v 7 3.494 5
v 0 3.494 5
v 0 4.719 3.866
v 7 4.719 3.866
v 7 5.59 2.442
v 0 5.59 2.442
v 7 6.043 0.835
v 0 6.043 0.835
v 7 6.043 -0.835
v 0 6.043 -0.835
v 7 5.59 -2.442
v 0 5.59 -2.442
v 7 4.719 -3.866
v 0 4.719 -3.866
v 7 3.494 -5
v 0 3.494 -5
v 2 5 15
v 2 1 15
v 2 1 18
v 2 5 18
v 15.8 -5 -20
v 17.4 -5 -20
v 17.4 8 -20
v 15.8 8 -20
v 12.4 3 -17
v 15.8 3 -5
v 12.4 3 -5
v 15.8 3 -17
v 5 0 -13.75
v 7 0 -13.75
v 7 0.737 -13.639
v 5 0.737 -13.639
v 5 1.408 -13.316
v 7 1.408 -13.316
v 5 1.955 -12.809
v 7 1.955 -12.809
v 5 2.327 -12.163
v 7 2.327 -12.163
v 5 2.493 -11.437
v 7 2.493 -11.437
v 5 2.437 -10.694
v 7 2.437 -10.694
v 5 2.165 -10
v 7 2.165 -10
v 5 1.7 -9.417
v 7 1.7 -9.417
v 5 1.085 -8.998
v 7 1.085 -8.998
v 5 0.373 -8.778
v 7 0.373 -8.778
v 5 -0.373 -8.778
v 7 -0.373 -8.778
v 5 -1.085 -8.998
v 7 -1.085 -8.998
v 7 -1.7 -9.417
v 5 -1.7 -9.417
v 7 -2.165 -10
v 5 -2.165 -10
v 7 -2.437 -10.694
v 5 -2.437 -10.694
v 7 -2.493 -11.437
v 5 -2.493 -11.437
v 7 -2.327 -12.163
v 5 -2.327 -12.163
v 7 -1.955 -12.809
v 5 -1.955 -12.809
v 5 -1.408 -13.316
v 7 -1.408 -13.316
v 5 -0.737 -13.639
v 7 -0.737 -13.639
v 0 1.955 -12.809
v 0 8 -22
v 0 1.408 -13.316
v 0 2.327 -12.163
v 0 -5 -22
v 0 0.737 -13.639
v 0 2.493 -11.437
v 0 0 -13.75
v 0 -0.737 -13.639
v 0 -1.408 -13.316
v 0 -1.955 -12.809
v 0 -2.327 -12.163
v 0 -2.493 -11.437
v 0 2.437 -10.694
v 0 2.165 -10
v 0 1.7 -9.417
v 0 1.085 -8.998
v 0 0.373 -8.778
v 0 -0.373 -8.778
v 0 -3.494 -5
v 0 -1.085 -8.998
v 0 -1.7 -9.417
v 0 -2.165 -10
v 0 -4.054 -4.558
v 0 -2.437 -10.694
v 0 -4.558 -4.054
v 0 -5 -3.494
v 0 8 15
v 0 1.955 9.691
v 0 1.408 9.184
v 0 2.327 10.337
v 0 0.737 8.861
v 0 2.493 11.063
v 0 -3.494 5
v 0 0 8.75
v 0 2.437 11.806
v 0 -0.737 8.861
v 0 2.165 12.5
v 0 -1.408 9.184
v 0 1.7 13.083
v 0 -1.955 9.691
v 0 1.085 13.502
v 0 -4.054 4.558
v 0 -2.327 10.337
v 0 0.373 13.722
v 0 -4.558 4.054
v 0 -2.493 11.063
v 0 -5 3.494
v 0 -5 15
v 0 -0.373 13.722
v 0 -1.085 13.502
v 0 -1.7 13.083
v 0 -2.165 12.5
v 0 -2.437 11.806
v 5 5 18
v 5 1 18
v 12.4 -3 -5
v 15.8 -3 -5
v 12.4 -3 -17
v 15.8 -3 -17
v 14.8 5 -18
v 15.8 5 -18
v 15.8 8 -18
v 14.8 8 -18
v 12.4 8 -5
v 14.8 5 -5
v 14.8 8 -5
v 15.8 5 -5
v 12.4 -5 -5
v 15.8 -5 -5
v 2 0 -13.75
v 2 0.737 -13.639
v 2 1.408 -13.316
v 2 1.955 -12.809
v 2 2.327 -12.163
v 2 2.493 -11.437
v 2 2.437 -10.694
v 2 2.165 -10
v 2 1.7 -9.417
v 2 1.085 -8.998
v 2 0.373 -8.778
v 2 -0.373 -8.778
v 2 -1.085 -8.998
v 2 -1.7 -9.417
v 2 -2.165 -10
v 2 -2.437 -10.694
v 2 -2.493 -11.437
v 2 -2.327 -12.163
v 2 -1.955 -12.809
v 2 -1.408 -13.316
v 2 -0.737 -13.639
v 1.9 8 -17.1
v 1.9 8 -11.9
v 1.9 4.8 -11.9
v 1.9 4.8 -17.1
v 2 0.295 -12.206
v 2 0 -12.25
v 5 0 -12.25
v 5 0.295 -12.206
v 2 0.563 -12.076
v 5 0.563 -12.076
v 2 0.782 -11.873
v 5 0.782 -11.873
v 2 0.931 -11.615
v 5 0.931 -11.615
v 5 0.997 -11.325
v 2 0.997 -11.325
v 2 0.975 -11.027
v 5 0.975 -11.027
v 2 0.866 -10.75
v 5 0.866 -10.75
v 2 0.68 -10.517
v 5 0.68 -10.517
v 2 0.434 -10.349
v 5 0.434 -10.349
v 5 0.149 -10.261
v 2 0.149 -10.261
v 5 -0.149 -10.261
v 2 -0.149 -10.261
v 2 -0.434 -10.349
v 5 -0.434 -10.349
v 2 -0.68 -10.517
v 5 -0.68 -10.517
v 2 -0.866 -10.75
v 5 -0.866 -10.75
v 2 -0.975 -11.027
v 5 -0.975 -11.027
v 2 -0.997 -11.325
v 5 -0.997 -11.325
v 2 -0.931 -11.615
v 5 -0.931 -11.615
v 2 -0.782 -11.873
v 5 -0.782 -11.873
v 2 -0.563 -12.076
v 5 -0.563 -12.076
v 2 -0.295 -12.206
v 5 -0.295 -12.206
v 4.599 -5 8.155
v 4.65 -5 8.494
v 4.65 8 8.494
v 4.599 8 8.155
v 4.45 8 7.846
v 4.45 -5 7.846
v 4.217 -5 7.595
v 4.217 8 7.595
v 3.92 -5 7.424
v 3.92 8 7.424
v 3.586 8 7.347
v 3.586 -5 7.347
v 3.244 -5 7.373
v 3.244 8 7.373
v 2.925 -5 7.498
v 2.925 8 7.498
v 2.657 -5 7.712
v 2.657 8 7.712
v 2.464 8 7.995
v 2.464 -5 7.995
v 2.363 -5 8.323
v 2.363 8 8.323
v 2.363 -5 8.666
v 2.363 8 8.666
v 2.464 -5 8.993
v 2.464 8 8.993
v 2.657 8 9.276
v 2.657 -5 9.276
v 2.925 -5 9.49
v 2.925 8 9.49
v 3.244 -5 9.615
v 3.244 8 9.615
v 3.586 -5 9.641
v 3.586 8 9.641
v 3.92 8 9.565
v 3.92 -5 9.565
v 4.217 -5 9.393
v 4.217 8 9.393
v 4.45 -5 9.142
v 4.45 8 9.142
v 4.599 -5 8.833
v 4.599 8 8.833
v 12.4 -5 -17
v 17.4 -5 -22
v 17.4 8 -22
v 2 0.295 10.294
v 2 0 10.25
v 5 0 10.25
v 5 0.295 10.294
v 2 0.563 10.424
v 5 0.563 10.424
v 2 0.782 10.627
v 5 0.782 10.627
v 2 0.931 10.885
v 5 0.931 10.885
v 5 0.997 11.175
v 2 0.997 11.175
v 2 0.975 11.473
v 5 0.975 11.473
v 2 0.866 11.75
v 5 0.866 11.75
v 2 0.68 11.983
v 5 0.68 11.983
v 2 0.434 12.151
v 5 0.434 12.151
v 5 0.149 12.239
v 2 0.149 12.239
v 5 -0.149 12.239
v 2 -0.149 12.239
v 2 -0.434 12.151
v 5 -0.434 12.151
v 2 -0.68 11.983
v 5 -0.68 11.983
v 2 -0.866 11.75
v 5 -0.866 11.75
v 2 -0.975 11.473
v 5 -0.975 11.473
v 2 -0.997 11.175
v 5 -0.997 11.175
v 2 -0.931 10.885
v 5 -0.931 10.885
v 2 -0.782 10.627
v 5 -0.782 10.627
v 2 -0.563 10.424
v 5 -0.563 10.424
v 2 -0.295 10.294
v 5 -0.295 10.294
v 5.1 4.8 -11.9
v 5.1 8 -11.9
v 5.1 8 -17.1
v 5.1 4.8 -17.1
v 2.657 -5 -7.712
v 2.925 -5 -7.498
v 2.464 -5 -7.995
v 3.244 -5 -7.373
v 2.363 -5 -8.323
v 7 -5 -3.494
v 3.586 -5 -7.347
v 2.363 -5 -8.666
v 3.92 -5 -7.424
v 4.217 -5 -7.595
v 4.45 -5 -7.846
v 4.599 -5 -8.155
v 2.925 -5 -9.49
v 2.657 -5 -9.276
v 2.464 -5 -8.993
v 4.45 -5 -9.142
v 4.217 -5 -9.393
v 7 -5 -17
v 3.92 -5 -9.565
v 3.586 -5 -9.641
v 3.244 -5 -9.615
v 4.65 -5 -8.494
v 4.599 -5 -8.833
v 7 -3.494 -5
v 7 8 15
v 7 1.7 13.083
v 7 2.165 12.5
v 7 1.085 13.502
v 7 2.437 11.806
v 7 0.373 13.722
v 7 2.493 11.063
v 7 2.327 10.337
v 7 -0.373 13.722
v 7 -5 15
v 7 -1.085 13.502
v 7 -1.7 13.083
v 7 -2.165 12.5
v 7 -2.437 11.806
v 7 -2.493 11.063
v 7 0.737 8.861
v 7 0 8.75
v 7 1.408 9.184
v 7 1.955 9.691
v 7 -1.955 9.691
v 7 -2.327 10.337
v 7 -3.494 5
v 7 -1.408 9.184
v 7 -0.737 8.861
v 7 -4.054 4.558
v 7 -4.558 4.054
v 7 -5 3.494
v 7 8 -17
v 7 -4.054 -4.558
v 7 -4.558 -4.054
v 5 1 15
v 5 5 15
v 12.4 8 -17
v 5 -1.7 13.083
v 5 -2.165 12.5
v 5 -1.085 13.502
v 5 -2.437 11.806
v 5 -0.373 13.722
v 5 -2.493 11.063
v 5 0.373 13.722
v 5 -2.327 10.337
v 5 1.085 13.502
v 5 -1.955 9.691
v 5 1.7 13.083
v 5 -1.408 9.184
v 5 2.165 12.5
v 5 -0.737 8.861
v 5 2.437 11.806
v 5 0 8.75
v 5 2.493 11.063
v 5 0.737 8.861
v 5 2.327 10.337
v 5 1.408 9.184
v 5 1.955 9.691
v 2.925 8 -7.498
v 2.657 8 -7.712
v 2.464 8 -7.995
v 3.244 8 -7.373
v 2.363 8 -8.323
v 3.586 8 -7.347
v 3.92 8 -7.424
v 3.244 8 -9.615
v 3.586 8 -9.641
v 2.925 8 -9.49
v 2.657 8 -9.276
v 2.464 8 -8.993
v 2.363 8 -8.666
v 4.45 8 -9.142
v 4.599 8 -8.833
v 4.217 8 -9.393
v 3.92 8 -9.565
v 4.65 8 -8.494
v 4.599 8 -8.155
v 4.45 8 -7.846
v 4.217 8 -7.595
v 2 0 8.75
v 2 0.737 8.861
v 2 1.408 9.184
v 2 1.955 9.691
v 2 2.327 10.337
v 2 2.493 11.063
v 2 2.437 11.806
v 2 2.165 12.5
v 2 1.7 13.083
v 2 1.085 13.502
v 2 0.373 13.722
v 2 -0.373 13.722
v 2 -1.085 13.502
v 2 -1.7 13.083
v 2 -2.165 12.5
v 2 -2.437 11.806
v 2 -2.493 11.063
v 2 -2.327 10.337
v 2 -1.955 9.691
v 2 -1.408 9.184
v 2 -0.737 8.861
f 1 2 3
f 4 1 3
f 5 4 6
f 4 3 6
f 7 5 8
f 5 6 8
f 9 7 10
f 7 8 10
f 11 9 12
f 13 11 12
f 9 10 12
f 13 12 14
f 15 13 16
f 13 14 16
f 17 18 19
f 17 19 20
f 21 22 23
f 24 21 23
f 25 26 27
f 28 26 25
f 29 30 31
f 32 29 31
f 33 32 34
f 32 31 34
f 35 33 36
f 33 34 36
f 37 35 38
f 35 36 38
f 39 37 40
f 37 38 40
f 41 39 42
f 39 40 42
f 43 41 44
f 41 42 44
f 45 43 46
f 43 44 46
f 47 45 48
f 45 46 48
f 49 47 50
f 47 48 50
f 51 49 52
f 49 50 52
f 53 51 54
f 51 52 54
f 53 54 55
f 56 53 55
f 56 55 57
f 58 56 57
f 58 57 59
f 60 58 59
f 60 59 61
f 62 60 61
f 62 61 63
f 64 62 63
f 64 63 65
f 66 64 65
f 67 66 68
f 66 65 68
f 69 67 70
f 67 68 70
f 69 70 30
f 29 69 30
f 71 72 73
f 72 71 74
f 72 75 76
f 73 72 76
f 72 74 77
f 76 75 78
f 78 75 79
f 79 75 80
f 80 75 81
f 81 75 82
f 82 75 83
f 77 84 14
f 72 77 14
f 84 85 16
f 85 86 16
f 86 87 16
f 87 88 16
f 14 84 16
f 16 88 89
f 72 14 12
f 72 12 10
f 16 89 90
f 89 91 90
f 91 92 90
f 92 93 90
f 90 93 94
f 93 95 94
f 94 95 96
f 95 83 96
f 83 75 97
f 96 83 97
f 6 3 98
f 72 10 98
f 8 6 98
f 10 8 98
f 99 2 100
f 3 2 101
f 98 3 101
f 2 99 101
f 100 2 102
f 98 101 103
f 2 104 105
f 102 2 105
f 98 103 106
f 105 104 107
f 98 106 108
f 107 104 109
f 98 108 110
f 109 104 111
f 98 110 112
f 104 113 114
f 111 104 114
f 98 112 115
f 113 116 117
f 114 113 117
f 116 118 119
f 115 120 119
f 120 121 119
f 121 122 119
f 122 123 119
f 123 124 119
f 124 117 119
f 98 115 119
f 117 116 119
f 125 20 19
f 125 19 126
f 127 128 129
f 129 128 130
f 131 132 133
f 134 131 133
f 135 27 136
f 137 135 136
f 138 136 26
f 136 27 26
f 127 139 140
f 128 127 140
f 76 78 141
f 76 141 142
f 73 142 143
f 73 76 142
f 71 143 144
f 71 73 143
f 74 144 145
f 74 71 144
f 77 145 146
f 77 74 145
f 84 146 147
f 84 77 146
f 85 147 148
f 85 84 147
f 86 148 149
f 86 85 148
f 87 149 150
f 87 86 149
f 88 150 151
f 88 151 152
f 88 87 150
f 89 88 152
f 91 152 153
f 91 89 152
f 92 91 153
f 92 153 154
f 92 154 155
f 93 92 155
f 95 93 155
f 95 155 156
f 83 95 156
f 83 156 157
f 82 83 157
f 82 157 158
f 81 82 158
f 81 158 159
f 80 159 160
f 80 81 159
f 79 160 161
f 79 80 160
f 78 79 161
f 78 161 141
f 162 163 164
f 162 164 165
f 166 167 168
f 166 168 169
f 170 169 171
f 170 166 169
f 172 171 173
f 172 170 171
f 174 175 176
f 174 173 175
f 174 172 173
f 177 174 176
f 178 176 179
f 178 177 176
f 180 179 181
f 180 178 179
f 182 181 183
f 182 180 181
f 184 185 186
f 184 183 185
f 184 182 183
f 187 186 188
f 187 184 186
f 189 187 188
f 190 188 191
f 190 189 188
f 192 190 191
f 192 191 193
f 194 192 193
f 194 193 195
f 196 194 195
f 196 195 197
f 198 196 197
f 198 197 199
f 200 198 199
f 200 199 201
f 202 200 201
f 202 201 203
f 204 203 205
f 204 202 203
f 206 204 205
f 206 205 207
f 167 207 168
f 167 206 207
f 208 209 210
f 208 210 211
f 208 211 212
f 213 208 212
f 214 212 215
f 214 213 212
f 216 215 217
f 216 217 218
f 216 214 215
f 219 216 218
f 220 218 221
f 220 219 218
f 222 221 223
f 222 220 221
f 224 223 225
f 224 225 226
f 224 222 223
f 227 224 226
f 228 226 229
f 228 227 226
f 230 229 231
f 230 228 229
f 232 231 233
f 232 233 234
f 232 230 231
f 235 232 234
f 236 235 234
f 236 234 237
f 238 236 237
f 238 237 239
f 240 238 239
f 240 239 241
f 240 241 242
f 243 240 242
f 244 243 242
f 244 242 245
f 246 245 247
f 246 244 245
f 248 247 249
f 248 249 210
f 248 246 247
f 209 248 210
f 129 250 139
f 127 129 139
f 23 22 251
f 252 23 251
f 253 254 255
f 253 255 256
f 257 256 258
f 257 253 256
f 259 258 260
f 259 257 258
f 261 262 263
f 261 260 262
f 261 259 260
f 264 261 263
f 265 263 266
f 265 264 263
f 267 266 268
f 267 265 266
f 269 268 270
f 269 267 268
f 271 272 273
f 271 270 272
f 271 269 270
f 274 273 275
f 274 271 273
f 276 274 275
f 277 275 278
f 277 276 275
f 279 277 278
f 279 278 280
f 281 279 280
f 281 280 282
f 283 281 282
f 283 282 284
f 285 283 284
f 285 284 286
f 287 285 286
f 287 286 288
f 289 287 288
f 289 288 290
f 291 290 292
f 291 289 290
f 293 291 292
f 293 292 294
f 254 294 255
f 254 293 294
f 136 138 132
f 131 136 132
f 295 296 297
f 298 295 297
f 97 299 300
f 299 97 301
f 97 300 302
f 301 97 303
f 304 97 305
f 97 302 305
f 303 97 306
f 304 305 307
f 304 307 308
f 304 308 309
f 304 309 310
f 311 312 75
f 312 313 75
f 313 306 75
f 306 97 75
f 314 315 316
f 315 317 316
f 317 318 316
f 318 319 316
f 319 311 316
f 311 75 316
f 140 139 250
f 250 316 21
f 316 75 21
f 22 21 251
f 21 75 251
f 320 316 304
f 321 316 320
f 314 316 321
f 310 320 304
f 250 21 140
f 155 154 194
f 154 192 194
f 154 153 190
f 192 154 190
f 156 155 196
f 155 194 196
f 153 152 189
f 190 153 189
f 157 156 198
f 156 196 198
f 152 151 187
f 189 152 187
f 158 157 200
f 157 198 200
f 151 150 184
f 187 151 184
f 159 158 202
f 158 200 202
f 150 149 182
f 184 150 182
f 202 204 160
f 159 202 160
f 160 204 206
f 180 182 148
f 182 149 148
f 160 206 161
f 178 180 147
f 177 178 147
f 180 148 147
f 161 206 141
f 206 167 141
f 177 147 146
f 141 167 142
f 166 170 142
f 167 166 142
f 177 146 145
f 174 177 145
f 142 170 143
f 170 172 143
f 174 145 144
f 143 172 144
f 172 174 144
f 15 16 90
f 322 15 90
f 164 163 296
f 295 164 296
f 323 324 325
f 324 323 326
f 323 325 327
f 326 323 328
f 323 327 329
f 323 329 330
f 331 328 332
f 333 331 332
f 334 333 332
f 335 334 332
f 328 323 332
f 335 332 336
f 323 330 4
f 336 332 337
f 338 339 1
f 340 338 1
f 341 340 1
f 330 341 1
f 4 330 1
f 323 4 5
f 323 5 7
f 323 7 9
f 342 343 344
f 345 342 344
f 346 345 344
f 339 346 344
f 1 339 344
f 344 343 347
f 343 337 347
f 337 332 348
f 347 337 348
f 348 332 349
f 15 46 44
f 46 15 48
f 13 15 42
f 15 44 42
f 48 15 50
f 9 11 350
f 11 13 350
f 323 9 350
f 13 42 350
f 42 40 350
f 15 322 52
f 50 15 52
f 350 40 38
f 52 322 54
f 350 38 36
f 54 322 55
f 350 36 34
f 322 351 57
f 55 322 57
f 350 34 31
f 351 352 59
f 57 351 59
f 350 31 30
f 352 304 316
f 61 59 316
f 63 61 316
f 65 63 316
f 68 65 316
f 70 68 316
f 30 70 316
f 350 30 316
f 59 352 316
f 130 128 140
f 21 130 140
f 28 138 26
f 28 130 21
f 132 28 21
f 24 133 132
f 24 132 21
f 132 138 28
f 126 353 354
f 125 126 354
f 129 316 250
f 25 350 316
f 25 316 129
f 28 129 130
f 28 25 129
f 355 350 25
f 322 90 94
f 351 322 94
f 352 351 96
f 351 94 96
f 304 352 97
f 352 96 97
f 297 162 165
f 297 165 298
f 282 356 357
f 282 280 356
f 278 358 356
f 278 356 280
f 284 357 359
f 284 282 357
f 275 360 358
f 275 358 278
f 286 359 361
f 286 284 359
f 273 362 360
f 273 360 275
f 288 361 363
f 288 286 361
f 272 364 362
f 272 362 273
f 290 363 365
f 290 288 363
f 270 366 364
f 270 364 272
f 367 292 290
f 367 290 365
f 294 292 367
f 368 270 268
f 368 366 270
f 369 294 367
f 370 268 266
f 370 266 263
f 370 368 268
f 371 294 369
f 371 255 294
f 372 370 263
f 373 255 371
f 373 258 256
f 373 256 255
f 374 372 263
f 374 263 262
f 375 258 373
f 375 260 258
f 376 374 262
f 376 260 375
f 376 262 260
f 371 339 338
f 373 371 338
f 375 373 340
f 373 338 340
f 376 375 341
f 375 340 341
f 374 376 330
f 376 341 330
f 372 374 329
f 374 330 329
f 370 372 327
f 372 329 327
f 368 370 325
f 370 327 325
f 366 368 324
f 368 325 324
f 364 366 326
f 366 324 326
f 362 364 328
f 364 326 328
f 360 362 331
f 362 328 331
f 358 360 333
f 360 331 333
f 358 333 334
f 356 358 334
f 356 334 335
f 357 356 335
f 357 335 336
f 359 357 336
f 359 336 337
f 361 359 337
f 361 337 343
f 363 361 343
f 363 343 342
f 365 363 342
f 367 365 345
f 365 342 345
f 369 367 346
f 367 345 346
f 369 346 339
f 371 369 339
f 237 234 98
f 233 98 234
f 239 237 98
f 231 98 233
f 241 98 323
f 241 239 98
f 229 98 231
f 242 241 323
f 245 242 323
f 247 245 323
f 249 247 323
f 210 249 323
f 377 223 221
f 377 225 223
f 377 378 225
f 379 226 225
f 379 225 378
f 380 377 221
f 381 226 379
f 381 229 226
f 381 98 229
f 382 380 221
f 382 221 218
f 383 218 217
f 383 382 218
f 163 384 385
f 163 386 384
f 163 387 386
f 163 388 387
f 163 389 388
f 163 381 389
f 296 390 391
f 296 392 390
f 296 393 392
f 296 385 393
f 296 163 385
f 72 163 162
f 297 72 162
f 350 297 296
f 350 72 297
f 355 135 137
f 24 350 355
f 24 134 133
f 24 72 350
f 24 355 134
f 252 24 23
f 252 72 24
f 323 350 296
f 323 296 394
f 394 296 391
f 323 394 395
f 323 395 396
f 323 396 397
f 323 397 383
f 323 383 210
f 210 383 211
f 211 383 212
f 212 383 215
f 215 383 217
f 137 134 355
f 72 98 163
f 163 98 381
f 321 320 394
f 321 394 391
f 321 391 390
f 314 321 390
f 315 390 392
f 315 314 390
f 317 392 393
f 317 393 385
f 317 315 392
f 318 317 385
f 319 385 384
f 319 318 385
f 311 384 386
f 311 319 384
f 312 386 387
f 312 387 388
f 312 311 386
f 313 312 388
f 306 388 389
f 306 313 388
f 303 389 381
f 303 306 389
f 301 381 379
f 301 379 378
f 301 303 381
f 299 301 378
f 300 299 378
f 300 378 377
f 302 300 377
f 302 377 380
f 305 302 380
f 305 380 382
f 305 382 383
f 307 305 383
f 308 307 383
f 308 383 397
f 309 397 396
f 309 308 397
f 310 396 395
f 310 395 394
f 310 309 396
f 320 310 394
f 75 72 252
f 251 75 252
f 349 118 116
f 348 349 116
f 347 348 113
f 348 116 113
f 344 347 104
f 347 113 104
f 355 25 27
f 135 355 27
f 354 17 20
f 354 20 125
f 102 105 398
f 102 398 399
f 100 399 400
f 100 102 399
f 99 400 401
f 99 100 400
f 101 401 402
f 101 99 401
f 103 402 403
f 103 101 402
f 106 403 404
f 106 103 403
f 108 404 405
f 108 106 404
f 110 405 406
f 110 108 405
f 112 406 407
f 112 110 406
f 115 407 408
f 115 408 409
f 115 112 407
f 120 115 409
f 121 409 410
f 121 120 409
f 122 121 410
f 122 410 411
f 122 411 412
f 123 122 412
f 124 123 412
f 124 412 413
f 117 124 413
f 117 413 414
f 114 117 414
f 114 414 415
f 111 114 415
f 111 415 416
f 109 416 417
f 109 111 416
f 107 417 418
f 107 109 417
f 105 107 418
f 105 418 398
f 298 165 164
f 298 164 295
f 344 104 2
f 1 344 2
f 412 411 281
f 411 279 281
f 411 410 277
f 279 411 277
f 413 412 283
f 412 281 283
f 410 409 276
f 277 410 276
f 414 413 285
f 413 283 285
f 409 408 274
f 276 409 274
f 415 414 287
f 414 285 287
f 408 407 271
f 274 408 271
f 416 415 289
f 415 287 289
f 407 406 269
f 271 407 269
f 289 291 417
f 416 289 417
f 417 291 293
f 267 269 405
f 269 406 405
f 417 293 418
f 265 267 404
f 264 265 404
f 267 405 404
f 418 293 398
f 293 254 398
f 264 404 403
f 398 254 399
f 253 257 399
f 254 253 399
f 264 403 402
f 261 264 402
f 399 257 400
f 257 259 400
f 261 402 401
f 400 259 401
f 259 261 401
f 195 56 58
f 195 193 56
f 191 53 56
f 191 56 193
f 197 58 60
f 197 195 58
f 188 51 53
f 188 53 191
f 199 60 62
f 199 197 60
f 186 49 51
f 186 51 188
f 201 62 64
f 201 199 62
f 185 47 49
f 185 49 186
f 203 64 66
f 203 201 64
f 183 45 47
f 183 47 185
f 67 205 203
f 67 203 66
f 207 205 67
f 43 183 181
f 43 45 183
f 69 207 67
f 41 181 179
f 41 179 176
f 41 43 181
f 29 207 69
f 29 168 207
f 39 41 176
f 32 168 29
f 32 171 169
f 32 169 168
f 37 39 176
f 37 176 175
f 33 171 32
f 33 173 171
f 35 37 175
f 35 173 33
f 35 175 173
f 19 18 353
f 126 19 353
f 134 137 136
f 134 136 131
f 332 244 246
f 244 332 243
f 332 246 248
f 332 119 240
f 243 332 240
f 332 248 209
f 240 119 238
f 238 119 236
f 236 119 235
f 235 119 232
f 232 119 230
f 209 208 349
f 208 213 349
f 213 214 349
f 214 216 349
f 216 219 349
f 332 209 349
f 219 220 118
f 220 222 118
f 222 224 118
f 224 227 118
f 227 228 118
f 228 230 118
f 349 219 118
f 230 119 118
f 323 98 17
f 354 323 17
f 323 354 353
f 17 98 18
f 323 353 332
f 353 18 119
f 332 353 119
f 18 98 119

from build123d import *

# Parameters (mm, degrees)
SKETCH2_R           = 1
BOSS_EXTRUDE1_DEPTH = 7
CUT_EXTRUDE1_START  = -5
SKETCH3_R           = 1.15
CUT_EXTRUDE1_DEPTH  = 13
SKETCH5_R           = 2.5
CUT_EXTRUDE2_DEPTH  = 2
CUT_EXTRUDE3_START  = 7
SKETCH5_2_R         = 2.5
CUT_EXTRUDE3_DEPTH  = 2
BOSS_EXTRUDE2_START = -5
BOSS_EXTRUDE2_DEPTH = 13
CUT_EXTRUDE4_START  = 17.4
SKETCH7_W           = 12
SKETCH7_H           = 6
CUT_EXTRUDE4_DEPTH  = 6
CUT_EXTRUDE5_START  = 17.4
SKETCH8_W           = 15
SKETCH8_H           = 13
CUT_EXTRUDE5_DEPTH  = 1.6
CUT_EXTRUDE6_START  = 15.8
SKETCH9_W           = 13
SKETCH9_H           = 3
CUT_EXTRUDE6_DEPTH  = 1
BOSS_EXTRUDE3_START = 8
SKETCH10_W          = 5.4
SKETCH10_H          = 5
BOSS_EXTRUDE3_DEPTH = 13
CUT_EXTRUDE7_START  = 8
SKETCH11_W          = 17.4
SKETCH11_H          = 3
CUT_EXTRUDE7_DEPTH  = 13
BOSS_EXTRUDE4_START = 15
SKETCH12_W          = 3
SKETCH12_H          = 4
BOSS_EXTRUDE4_DEPTH = 3
CUT_EXTRUDE8_START  = 8
SKETCH13_W          = 3.2
SKETCH13_H          = 5.2
CUT_EXTRUDE8_DEPTH  = 3.2


with BuildPart() as part:
    # Sketch2 → Boss-Extrude1 (new body)
    with BuildSketch(Plane(origin=(0, 0, 0), x_dir=(0, 0, -1), z_dir=(1, 0, 0))):
        with BuildLine():
            Line((3.494281042, -5), (15, -5))
            Line((15, -5), (15, 8))
            Line((15, 8), (-15, 8))
            Line((-15, 8), (-15, -5))
            Line((-15, -5), (-3.494281042, -5))
            ThreePointArc((-3.494281042, -5), (-4.313351365, -4.313351365), (-5, -3.494281042))
            Line((-5, -3.494281042), (-5, 3.494281042))
            ThreePointArc((-5, 3.494281042), (0, 6.1), (5, 3.494281042))
            Line((5, 3.494281042), (5, -3.494281042))
            ThreePointArc((5, -3.494281042), (4.313351365, -4.313351365), (3.494281042, -5))
        make_face()
        with Locations((-11.25, 0)):
            Circle(SKETCH2_R, mode=Mode.SUBTRACT)
        with Locations((11.25, 0)):
            Circle(SKETCH2_R, mode=Mode.SUBTRACT)
    extrude(amount=BOSS_EXTRUDE1_DEPTH)

    # Sketch3 → Cut-Extrude1 (cut)
    with BuildSketch(Plane(origin=(0, 0, 0), x_dir=(1, 0, 0), z_dir=(0, 1, 0)).offset(CUT_EXTRUDE1_START)):
        with Locations((3.5, 8.494281042)):
            Circle(SKETCH3_R)
        with Locations((3.5, -8.494281042)):
            Circle(SKETCH3_R)
    extrude(amount=CUT_EXTRUDE1_DEPTH, mode=Mode.SUBTRACT)

    # Sketch5 → Cut-Extrude2 (cut)
    with BuildSketch(Plane(origin=(0, 0, 0), x_dir=(0, 0, -1), z_dir=(1, 0, 0))):
        with Locations((11.25, 0)):
            Circle(SKETCH5_R)
        with Locations((-11.25, 0)):
            Circle(SKETCH5_R)
    extrude(amount=CUT_EXTRUDE2_DEPTH, mode=Mode.SUBTRACT)

    # Sketch5<2> → Cut-Extrude3 (cut)
    with BuildSketch(Plane(origin=(0, 0, 0), x_dir=(0, 0, -1), z_dir=(1, 0, 0)).offset(CUT_EXTRUDE3_START)):
        with Locations((11.25, 0)):
            Circle(SKETCH5_2_R)
        with Locations((-11.25, 0)):
            Circle(SKETCH5_2_R)
    extrude(amount=-CUT_EXTRUDE3_DEPTH, mode=Mode.SUBTRACT)

    # Sketch6 → Boss-Extrude2 (add)
    with BuildSketch(Plane(origin=(0, 0, 0), x_dir=(1, 0, 0), z_dir=(0, 1, 0)).offset(BOSS_EXTRUDE2_START)):
        Polygon((0, 15), (7, 15), (7, 22), (12.4, 22), (12.4, 5), (17.4, 5), (17.4, 25), (0, 25), align=None)
    extrude(amount=BOSS_EXTRUDE2_DEPTH)

    # Sketch7 → Cut-Extrude4 (cut)
    with BuildSketch(Plane(origin=(0, 0, 0), x_dir=(0, 0, -1), z_dir=(1, 0, 0)).offset(CUT_EXTRUDE4_START)):
        with Locations((11, 0)):
            Rectangle(SKETCH7_W, SKETCH7_H)
    extrude(amount=-CUT_EXTRUDE4_DEPTH, mode=Mode.SUBTRACT)

    # Sketch8 → Cut-Extrude5 (cut)
    with BuildSketch(Plane(origin=(0, 0, 0), x_dir=(0, 0, -1), z_dir=(1, 0, 0)).offset(CUT_EXTRUDE5_START)):
        with Locations((12.5, 1.5)):
            Rectangle(SKETCH8_W, SKETCH8_H)
    extrude(amount=-CUT_EXTRUDE5_DEPTH, mode=Mode.SUBTRACT)

    # Sketch9 → Cut-Extrude6 (cut)
    with BuildSketch(Plane(origin=(0, 0, 0), x_dir=(0, 0, -1), z_dir=(1, 0, 0)).offset(CUT_EXTRUDE6_START)):
        with Locations((11.5, 6.5)):
            Rectangle(SKETCH9_W, SKETCH9_H)
    extrude(amount=-CUT_EXTRUDE6_DEPTH, mode=Mode.SUBTRACT)

    # Sketch10 → Boss-Extrude3 (add)
    with BuildSketch(Plane(origin=(0, 0, 0), x_dir=(1, 0, 0), z_dir=(0, 1, 0)).offset(BOSS_EXTRUDE3_START)):
        with Locations((9.7, 19.5)):
            Rectangle(SKETCH10_W, SKETCH10_H)
    extrude(amount=-BOSS_EXTRUDE3_DEPTH)

    # Sketch11 → Cut-Extrude7 (cut)
    with BuildSketch(Plane(origin=(0, 0, 0), x_dir=(1, 0, 0), z_dir=(0, 1, 0)).offset(CUT_EXTRUDE7_START)):
        with Locations((8.7, 23.5)):
            Rectangle(SKETCH11_W, SKETCH11_H)
    extrude(amount=-CUT_EXTRUDE7_DEPTH, mode=Mode.SUBTRACT)

    # Sketch12 → Boss-Extrude4 (add)
    with BuildSketch(Plane.XY.offset(BOSS_EXTRUDE4_START)):
        with Locations((3.5, 3)):
            Rectangle(SKETCH12_W, SKETCH12_H)
    extrude(amount=BOSS_EXTRUDE4_DEPTH)

    # Sketch13 → Cut-Extrude8 (cut)
    with BuildSketch(Plane(origin=(0, 0, 0), x_dir=(1, 0, 0), z_dir=(0, 1, 0)).offset(CUT_EXTRUDE8_START)):
        with Locations((3.5, 14.5)):
            Rectangle(SKETCH13_W, SKETCH13_H)
    extrude(amount=-CUT_EXTRUDE8_DEPTH, mode=Mode.SUBTRACT)


solid = part.part
